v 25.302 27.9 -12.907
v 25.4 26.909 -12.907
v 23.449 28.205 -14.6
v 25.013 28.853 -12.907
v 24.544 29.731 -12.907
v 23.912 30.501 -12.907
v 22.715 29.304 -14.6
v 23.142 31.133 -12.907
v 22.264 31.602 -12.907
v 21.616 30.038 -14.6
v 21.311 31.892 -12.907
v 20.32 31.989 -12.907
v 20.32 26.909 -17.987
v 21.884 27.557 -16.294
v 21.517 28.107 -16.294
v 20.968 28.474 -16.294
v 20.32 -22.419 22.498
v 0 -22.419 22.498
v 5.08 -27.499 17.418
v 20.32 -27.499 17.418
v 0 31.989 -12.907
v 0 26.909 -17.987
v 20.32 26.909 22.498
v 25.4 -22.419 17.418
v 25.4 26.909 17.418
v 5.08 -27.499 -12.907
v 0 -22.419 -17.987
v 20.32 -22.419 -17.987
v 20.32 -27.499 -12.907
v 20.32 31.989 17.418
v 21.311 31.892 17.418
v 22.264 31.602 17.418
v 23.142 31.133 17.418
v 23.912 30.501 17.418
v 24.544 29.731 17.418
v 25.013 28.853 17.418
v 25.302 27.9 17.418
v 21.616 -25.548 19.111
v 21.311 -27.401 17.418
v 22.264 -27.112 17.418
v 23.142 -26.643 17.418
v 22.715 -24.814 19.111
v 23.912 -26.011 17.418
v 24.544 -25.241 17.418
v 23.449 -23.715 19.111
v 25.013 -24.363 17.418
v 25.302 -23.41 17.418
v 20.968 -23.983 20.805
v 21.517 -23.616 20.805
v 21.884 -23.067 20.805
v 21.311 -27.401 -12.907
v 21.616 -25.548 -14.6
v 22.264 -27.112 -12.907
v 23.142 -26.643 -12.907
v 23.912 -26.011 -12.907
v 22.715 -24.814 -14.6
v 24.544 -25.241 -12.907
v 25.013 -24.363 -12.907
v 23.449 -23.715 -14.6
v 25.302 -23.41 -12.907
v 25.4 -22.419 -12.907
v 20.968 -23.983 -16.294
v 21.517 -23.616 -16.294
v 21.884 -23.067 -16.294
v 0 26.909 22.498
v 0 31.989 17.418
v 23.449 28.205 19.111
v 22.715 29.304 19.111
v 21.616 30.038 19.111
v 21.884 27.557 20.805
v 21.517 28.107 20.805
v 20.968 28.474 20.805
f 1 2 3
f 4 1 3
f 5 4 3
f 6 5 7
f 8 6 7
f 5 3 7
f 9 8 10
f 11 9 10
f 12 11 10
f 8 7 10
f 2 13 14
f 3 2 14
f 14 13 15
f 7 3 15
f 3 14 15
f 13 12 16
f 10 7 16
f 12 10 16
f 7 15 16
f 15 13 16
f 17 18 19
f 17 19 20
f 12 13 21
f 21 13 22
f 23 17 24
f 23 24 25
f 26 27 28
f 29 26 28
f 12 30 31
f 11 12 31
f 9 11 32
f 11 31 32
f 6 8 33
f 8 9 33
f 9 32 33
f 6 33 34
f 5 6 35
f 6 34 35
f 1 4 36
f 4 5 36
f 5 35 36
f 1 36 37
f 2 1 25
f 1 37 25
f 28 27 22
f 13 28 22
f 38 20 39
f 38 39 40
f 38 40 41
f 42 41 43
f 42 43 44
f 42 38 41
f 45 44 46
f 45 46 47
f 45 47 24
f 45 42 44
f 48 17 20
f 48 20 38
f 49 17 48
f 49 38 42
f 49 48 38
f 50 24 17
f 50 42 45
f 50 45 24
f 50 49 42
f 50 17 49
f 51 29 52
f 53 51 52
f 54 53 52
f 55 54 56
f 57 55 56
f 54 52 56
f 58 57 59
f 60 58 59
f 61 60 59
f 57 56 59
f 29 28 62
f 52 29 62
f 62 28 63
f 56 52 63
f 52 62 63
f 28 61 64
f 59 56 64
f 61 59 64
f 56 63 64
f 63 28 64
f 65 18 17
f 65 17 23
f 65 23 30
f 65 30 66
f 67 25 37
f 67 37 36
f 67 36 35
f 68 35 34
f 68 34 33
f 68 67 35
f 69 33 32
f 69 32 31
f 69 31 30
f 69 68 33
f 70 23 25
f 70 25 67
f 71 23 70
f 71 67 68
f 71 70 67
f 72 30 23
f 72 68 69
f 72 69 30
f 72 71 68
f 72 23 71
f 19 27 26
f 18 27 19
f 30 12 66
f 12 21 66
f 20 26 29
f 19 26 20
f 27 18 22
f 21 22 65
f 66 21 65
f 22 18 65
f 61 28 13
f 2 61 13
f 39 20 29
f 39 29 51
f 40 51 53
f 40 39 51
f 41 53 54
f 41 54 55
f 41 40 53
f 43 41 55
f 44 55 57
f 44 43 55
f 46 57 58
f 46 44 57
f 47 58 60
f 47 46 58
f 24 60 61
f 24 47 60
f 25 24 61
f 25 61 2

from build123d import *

# Parameters (mm, degrees)
F0_W     = 59.488162
F0_H     = 40.484803
F1_DEPTH = 25.4
F2_R     = 5.08
F3_SIZE  = 5.08


with BuildPart() as f1:
    # F0 (on Right) → F1 (new body)
    with BuildSketch(Plane.YZ):
        with Locations((2.245061, 2.255453)):
            Rectangle(F0_W, F0_H)
    extrude(amount=F1_DEPTH)

    # F2
    f2_edges = [f1.edges().sort_by_distance(p)[0] for p in [
        (25.4, -27.49902, 2.255454),
        (25.4, 31.989142, 2.255454),
    ]]
    fillet(f2_edges, radius=F2_R)

    # F3
    f3_edges = [f1.edges().sort_by_distance(p)[0] for p in [
        (10.16, -27.49902, 22.497855),
        (20.32, -27.49902, 2.255454),
        (0, -27.49902, 2.255454),
        (10.16, -27.49902, -17.986948),
    ]]
    chamfer(f3_edges, length=F3_SIZE)


solid = f1.part
